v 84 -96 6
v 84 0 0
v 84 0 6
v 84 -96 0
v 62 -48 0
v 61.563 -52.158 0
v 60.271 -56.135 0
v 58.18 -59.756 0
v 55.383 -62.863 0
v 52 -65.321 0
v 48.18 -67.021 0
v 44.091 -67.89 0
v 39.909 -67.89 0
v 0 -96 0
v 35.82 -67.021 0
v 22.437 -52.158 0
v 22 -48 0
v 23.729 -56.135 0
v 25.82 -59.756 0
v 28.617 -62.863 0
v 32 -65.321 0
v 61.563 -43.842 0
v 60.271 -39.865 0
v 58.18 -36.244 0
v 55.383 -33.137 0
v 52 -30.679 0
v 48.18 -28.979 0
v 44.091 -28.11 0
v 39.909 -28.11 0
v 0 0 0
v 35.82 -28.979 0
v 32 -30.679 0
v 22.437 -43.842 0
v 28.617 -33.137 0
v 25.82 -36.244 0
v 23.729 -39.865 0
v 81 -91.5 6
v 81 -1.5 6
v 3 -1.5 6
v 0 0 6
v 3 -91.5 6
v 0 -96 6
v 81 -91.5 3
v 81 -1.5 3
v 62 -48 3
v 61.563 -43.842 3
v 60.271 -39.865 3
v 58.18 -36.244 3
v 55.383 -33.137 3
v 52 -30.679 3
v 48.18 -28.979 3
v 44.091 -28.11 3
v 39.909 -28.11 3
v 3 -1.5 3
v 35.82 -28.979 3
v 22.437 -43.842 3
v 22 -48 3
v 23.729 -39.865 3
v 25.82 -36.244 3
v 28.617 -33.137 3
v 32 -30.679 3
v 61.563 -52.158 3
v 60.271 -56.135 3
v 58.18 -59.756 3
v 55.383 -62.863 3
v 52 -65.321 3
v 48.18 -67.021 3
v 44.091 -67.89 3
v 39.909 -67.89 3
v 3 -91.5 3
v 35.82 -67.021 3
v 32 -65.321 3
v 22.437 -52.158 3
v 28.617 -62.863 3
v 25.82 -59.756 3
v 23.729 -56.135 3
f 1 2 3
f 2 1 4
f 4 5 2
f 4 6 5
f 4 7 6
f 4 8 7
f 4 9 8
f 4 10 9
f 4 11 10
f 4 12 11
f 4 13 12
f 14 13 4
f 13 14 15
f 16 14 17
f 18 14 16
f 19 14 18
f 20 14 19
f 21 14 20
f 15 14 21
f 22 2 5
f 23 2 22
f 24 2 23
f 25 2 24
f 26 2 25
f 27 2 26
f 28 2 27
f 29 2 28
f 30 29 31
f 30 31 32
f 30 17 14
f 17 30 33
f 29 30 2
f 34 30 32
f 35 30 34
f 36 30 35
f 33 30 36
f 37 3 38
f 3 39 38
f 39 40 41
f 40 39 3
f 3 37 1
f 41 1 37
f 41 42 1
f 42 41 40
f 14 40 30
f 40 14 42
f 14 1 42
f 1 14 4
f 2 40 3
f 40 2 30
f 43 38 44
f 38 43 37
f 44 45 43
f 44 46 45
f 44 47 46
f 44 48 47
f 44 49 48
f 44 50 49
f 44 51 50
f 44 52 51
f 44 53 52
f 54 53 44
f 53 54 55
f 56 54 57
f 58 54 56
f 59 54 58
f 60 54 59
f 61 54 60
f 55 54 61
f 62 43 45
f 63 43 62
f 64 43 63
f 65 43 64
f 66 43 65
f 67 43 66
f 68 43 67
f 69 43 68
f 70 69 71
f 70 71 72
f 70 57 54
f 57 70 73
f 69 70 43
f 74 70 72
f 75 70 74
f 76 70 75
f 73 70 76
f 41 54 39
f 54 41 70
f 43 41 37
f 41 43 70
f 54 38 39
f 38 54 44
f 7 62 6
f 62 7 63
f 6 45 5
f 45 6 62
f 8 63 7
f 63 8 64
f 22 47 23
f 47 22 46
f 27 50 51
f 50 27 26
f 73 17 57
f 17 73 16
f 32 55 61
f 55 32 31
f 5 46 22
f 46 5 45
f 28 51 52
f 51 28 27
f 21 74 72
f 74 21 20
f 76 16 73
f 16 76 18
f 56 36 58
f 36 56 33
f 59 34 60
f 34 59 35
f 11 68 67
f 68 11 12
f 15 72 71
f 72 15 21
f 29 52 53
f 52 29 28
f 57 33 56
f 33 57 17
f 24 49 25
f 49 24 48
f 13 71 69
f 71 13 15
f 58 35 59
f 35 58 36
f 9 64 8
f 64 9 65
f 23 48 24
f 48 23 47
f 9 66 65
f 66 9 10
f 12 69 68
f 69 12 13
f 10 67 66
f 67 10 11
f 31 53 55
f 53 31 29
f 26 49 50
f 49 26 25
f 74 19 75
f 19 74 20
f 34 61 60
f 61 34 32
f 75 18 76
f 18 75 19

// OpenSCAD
// file: ../../../../neje-dk-8-kz-bed.scad
module nejeDk8KzBed()
{
	xLength = nejeDk8KzBed_xLength();
	yLength = nejeDk8KzBed_yLength();
	zLength = nejeDk8KzBed_zLength();

	cube([xLength, yLength, zLength]);
}

/** Support functions and modules follow. **/

function nejeDk8KzBed_xLength() = 78;

function nejeDk8KzBed_yLength() = 90;

function nejeDk8KzBed_zLength() = 3;
// file: ../../../../../laser-engraver-jig.scad
module laserEngraverJig(bed_xLength, bed_yLength, bed_zLength,
						xLength, yLength, zLength)
{
	laserEngraverJig_base(bed_xLength, bed_yLength, bed_zLength,
						  xLength, yLength, zLength);
}

/** Support functions and modules follow. **/

module laserEngraverJig_base(bed_xLength, bed_yLength, bed_zLength,
							 xLength, yLength, zLength)
{
	difference()
	{
		// main block
		cube([xLength, yLength, zLength]);

		// bed cutout
		xTranslate = (xLength - bed_xLength) / 2.0;
		yTranslate = (yLength - bed_yLength) / 2.0;
		color("green")
		translate([xTranslate, yTranslate, -0.01])
		cube([bed_xLength, bed_yLength, bed_zLength + 0.01]);
	}
}
// file: ../../neje-laser-engraver-disk-jig.scad
use <../../../laser-engraver-jig.scad>

use <../../neje-dk-8-kz-bed.scad>

module nejeLaserEngraverDiskJig()
{
	bed_xLength = nejeDk8KzBed_xLength();
	bed_yLength = nejeDk8KzBed_yLength();
	bed_zLength = nejeDk8KzBed_zLength();

	xyIncrease = 3 * 2;

	xLength = nejeDk8KzBed_xLength() + xyIncrease;
	yLength = nejeDk8KzBed_yLength() + xyIncrease;
	zLength = nejeLaserEngraverDiskJig_zLength();

	difference()
	{
		nejeLaserEngraverDiskJig_block(bed_xLength, bed_yLength, bed_zLength,
						 			   xLength, yLength, zLength);

		nejeLaserEngraverDiskJig_cutout(xLength, yLength, zLength);
	}
}

/** Support functions and modules follow. **/

function nejeLaserEngraverDiskJig_zLength() = nejeDk8KzBed_zLength() * 2;

module nejeLaserEngraverDiskJig_block(bed_xLength, bed_yLength, bed_zLength,
				 					  xLength, yLength, zLength)
{
	laserEngraverJig(bed_xLength, bed_yLength, bed_zLength,
					 xLength, yLength, zLength);
}

module nejeLaserEngraverDiskJig_cutout(xLength, yLength, zLength)
{
	radius = 40 / 2.0;
	xTranslate = xLength / 2.0;
	yTranslate = yLength / 2.0;
	translate([xTranslate, yTranslate, -0.01])
	cylinder(r=radius, h=10);
}
// main file
use <../../neje-laser-engraver-disk-jig.scad>

zTranslate = nejeLaserEngraverDiskJig_zLength();

translate([0,0,zTranslate])
rotate([180, 0, 0])
nejeLaserEngraverDiskJig();
